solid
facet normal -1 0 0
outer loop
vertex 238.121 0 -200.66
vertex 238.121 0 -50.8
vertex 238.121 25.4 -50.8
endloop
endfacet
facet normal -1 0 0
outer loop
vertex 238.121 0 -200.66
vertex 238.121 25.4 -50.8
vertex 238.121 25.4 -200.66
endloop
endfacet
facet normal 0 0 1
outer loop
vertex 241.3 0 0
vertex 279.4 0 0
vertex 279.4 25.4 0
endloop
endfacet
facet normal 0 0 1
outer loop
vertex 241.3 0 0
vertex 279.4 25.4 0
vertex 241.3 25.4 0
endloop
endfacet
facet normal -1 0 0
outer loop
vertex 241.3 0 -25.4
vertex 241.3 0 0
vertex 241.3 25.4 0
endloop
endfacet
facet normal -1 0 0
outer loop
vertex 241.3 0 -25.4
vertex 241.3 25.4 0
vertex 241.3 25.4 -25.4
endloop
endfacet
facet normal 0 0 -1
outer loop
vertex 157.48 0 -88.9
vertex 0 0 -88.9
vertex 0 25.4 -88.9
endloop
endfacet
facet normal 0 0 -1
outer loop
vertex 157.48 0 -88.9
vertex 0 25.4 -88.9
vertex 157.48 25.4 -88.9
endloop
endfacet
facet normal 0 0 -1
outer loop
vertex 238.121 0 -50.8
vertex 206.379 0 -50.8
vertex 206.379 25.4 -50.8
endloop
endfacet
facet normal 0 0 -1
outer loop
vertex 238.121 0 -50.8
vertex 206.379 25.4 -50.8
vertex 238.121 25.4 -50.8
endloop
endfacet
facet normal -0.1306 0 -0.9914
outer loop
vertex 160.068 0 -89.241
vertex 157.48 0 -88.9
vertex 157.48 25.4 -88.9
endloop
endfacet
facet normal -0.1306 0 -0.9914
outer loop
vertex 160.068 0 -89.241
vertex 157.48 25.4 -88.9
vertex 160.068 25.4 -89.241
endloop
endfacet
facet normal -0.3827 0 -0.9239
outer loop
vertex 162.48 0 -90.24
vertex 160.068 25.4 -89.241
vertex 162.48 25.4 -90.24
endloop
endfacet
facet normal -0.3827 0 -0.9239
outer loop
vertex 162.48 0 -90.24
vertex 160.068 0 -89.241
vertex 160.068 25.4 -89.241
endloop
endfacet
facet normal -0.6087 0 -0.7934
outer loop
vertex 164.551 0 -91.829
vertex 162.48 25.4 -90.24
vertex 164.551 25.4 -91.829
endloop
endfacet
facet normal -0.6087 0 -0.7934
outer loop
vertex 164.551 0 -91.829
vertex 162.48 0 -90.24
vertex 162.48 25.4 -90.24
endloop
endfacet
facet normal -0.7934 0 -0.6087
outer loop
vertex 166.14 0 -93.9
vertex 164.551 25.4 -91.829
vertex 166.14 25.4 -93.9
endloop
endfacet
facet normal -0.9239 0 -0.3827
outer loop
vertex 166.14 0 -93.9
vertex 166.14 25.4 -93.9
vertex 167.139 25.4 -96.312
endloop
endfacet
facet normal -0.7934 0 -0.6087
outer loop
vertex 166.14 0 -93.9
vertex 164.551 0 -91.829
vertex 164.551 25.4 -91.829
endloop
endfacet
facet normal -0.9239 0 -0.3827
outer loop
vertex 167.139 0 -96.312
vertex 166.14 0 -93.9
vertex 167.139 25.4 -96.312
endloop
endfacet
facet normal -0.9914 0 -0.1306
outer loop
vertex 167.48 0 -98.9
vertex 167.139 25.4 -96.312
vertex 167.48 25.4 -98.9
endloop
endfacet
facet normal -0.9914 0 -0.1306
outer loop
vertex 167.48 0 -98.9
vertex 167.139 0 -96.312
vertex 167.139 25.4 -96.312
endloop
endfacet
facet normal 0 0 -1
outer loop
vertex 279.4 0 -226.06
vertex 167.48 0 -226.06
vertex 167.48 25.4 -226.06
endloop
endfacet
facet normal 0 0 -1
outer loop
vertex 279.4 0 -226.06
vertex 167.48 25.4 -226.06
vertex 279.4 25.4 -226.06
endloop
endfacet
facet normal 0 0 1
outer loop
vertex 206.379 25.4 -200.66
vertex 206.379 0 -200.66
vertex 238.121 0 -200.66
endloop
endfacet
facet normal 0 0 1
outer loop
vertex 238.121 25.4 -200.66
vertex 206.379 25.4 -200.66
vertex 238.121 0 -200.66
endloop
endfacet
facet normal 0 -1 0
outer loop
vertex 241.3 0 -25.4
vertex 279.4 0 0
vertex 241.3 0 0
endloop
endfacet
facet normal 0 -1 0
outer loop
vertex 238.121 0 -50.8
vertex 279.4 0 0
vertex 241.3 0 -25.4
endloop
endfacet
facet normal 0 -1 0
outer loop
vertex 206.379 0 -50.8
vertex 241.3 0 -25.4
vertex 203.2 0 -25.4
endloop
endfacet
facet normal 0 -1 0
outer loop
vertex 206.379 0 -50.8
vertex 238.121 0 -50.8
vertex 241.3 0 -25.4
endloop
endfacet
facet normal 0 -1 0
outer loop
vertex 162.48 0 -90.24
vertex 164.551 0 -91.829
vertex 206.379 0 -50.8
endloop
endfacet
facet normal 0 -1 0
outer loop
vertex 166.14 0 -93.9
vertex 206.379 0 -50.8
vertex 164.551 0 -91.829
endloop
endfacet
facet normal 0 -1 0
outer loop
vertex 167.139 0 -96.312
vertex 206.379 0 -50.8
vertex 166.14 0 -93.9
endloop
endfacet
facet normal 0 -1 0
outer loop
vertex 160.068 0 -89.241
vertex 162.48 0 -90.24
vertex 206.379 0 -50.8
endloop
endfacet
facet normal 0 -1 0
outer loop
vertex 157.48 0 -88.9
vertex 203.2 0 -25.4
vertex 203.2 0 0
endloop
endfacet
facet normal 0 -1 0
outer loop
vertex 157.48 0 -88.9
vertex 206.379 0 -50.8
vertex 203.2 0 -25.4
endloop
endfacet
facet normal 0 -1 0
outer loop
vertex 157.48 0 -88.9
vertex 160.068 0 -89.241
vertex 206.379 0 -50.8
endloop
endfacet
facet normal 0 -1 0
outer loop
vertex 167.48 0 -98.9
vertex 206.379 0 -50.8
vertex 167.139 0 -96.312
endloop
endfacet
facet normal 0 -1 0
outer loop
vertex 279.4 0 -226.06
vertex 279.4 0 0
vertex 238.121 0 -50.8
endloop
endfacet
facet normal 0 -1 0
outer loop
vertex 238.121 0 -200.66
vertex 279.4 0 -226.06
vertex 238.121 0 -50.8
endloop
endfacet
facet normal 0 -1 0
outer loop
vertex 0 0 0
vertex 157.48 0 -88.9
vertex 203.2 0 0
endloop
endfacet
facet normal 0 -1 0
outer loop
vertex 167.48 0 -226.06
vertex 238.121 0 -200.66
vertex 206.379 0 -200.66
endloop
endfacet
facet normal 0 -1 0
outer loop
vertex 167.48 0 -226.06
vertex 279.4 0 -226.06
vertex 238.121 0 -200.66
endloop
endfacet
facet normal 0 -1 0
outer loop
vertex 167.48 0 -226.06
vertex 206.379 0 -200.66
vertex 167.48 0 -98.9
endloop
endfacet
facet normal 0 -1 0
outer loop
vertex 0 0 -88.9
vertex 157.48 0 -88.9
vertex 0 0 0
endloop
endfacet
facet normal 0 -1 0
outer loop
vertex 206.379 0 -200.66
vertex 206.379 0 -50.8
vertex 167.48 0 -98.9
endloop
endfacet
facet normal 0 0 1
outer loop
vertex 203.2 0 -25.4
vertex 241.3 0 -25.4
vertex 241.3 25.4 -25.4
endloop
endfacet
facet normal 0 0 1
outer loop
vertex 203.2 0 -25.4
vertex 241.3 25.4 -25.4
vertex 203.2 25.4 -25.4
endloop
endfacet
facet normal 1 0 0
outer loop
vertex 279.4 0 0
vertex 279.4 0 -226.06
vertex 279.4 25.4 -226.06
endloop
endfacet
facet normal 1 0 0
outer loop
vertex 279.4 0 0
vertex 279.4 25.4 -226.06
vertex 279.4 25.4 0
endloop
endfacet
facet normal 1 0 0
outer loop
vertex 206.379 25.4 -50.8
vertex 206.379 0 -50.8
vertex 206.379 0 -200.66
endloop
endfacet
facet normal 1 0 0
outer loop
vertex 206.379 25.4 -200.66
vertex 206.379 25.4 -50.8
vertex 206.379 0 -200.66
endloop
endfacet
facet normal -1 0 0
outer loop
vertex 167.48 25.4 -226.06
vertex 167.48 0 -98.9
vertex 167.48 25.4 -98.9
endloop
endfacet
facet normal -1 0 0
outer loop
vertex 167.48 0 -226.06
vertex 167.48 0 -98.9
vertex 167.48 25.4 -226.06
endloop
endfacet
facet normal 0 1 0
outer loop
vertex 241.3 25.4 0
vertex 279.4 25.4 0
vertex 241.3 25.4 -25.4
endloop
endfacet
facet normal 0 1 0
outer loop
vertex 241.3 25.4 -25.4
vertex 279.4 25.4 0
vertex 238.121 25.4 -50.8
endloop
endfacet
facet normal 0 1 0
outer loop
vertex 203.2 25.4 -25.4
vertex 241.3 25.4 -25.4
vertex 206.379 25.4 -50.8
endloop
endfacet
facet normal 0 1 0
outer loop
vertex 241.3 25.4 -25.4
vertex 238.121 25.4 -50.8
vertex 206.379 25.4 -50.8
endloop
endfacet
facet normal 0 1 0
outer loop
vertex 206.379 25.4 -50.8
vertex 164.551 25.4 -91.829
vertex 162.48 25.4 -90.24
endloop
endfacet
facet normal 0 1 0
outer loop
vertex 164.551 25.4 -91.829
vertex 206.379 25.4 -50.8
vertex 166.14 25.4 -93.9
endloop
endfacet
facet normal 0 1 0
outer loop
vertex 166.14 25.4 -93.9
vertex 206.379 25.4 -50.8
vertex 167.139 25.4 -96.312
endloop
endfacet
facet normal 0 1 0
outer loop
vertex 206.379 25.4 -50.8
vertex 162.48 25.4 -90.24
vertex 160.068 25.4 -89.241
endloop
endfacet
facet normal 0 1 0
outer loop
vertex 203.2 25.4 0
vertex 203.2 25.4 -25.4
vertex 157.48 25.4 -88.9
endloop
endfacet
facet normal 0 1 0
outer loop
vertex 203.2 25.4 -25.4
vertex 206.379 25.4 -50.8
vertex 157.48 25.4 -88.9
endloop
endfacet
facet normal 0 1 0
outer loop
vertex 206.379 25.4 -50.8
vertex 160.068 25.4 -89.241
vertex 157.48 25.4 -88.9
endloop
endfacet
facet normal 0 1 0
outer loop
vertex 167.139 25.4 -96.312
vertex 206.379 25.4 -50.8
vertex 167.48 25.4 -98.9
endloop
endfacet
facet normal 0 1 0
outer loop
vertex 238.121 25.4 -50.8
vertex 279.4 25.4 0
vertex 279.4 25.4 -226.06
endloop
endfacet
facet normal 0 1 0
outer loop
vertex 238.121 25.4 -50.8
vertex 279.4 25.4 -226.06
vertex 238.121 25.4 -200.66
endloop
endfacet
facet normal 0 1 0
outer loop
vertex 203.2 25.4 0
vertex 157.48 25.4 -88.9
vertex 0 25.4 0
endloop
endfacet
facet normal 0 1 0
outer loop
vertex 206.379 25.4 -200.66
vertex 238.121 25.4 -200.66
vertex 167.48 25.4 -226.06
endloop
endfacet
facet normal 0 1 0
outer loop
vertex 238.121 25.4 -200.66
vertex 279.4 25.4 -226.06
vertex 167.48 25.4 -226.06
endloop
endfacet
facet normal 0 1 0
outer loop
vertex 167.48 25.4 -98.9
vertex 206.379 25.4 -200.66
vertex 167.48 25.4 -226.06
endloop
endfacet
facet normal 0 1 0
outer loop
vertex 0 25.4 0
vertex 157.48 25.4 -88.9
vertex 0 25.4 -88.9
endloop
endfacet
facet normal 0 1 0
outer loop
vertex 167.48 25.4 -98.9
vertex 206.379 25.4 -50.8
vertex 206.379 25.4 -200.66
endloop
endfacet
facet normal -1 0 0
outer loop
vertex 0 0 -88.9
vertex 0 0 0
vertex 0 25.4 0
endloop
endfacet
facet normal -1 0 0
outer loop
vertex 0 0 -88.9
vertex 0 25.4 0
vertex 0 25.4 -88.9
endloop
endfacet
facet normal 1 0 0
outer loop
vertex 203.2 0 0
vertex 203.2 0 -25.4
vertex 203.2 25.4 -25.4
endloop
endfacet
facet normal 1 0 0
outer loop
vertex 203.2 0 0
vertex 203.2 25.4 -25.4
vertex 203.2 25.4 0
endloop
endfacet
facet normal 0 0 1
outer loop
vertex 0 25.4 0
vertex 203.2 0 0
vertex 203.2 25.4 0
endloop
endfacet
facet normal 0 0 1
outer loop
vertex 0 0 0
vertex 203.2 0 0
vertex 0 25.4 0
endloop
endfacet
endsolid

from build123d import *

# Parameters (mm, degrees)
SKETCH1_W           = 31.742721484
SKETCH1_H           = 149.86
BOSS_EXTRUDE1_DEPTH = 25.4


with BuildPart() as part:
    # Sketch1 → Boss-Extrude1 (new body)
    with BuildSketch(Plane(origin=(0, 0, 0), x_dir=(1, 0, 0), z_dir=(0, 1, 0))):
        with BuildLine():
            Line((0, 0), (0, 88.9))
            Line((0, 88.9), (157.48, 88.9))
            ThreePointArc((157.48, 88.9), (164.551067812, 91.828932188), (167.48, 98.9))
            Line((167.48, 98.9), (167.48, 226.06))
            Line((167.48, 226.06), (279.4, 226.06))
            Line((279.4, 226.06), (279.4, 0))
            Line((279.4, 0), (241.3, 0))
            Line((241.3, 0), (241.3, 25.4))
            Line((241.3, 25.4), (203.2, 25.4))
            Line((203.2, 25.4), (203.2, 0))
            Line((203.2, 0), (0, 0))
        make_face()
        with Locations((222.25, 125.73)):
            Rectangle(SKETCH1_W, SKETCH1_H, mode=Mode.SUBTRACT)
    extrude(amount=BOSS_EXTRUDE1_DEPTH)


solid = part.part
